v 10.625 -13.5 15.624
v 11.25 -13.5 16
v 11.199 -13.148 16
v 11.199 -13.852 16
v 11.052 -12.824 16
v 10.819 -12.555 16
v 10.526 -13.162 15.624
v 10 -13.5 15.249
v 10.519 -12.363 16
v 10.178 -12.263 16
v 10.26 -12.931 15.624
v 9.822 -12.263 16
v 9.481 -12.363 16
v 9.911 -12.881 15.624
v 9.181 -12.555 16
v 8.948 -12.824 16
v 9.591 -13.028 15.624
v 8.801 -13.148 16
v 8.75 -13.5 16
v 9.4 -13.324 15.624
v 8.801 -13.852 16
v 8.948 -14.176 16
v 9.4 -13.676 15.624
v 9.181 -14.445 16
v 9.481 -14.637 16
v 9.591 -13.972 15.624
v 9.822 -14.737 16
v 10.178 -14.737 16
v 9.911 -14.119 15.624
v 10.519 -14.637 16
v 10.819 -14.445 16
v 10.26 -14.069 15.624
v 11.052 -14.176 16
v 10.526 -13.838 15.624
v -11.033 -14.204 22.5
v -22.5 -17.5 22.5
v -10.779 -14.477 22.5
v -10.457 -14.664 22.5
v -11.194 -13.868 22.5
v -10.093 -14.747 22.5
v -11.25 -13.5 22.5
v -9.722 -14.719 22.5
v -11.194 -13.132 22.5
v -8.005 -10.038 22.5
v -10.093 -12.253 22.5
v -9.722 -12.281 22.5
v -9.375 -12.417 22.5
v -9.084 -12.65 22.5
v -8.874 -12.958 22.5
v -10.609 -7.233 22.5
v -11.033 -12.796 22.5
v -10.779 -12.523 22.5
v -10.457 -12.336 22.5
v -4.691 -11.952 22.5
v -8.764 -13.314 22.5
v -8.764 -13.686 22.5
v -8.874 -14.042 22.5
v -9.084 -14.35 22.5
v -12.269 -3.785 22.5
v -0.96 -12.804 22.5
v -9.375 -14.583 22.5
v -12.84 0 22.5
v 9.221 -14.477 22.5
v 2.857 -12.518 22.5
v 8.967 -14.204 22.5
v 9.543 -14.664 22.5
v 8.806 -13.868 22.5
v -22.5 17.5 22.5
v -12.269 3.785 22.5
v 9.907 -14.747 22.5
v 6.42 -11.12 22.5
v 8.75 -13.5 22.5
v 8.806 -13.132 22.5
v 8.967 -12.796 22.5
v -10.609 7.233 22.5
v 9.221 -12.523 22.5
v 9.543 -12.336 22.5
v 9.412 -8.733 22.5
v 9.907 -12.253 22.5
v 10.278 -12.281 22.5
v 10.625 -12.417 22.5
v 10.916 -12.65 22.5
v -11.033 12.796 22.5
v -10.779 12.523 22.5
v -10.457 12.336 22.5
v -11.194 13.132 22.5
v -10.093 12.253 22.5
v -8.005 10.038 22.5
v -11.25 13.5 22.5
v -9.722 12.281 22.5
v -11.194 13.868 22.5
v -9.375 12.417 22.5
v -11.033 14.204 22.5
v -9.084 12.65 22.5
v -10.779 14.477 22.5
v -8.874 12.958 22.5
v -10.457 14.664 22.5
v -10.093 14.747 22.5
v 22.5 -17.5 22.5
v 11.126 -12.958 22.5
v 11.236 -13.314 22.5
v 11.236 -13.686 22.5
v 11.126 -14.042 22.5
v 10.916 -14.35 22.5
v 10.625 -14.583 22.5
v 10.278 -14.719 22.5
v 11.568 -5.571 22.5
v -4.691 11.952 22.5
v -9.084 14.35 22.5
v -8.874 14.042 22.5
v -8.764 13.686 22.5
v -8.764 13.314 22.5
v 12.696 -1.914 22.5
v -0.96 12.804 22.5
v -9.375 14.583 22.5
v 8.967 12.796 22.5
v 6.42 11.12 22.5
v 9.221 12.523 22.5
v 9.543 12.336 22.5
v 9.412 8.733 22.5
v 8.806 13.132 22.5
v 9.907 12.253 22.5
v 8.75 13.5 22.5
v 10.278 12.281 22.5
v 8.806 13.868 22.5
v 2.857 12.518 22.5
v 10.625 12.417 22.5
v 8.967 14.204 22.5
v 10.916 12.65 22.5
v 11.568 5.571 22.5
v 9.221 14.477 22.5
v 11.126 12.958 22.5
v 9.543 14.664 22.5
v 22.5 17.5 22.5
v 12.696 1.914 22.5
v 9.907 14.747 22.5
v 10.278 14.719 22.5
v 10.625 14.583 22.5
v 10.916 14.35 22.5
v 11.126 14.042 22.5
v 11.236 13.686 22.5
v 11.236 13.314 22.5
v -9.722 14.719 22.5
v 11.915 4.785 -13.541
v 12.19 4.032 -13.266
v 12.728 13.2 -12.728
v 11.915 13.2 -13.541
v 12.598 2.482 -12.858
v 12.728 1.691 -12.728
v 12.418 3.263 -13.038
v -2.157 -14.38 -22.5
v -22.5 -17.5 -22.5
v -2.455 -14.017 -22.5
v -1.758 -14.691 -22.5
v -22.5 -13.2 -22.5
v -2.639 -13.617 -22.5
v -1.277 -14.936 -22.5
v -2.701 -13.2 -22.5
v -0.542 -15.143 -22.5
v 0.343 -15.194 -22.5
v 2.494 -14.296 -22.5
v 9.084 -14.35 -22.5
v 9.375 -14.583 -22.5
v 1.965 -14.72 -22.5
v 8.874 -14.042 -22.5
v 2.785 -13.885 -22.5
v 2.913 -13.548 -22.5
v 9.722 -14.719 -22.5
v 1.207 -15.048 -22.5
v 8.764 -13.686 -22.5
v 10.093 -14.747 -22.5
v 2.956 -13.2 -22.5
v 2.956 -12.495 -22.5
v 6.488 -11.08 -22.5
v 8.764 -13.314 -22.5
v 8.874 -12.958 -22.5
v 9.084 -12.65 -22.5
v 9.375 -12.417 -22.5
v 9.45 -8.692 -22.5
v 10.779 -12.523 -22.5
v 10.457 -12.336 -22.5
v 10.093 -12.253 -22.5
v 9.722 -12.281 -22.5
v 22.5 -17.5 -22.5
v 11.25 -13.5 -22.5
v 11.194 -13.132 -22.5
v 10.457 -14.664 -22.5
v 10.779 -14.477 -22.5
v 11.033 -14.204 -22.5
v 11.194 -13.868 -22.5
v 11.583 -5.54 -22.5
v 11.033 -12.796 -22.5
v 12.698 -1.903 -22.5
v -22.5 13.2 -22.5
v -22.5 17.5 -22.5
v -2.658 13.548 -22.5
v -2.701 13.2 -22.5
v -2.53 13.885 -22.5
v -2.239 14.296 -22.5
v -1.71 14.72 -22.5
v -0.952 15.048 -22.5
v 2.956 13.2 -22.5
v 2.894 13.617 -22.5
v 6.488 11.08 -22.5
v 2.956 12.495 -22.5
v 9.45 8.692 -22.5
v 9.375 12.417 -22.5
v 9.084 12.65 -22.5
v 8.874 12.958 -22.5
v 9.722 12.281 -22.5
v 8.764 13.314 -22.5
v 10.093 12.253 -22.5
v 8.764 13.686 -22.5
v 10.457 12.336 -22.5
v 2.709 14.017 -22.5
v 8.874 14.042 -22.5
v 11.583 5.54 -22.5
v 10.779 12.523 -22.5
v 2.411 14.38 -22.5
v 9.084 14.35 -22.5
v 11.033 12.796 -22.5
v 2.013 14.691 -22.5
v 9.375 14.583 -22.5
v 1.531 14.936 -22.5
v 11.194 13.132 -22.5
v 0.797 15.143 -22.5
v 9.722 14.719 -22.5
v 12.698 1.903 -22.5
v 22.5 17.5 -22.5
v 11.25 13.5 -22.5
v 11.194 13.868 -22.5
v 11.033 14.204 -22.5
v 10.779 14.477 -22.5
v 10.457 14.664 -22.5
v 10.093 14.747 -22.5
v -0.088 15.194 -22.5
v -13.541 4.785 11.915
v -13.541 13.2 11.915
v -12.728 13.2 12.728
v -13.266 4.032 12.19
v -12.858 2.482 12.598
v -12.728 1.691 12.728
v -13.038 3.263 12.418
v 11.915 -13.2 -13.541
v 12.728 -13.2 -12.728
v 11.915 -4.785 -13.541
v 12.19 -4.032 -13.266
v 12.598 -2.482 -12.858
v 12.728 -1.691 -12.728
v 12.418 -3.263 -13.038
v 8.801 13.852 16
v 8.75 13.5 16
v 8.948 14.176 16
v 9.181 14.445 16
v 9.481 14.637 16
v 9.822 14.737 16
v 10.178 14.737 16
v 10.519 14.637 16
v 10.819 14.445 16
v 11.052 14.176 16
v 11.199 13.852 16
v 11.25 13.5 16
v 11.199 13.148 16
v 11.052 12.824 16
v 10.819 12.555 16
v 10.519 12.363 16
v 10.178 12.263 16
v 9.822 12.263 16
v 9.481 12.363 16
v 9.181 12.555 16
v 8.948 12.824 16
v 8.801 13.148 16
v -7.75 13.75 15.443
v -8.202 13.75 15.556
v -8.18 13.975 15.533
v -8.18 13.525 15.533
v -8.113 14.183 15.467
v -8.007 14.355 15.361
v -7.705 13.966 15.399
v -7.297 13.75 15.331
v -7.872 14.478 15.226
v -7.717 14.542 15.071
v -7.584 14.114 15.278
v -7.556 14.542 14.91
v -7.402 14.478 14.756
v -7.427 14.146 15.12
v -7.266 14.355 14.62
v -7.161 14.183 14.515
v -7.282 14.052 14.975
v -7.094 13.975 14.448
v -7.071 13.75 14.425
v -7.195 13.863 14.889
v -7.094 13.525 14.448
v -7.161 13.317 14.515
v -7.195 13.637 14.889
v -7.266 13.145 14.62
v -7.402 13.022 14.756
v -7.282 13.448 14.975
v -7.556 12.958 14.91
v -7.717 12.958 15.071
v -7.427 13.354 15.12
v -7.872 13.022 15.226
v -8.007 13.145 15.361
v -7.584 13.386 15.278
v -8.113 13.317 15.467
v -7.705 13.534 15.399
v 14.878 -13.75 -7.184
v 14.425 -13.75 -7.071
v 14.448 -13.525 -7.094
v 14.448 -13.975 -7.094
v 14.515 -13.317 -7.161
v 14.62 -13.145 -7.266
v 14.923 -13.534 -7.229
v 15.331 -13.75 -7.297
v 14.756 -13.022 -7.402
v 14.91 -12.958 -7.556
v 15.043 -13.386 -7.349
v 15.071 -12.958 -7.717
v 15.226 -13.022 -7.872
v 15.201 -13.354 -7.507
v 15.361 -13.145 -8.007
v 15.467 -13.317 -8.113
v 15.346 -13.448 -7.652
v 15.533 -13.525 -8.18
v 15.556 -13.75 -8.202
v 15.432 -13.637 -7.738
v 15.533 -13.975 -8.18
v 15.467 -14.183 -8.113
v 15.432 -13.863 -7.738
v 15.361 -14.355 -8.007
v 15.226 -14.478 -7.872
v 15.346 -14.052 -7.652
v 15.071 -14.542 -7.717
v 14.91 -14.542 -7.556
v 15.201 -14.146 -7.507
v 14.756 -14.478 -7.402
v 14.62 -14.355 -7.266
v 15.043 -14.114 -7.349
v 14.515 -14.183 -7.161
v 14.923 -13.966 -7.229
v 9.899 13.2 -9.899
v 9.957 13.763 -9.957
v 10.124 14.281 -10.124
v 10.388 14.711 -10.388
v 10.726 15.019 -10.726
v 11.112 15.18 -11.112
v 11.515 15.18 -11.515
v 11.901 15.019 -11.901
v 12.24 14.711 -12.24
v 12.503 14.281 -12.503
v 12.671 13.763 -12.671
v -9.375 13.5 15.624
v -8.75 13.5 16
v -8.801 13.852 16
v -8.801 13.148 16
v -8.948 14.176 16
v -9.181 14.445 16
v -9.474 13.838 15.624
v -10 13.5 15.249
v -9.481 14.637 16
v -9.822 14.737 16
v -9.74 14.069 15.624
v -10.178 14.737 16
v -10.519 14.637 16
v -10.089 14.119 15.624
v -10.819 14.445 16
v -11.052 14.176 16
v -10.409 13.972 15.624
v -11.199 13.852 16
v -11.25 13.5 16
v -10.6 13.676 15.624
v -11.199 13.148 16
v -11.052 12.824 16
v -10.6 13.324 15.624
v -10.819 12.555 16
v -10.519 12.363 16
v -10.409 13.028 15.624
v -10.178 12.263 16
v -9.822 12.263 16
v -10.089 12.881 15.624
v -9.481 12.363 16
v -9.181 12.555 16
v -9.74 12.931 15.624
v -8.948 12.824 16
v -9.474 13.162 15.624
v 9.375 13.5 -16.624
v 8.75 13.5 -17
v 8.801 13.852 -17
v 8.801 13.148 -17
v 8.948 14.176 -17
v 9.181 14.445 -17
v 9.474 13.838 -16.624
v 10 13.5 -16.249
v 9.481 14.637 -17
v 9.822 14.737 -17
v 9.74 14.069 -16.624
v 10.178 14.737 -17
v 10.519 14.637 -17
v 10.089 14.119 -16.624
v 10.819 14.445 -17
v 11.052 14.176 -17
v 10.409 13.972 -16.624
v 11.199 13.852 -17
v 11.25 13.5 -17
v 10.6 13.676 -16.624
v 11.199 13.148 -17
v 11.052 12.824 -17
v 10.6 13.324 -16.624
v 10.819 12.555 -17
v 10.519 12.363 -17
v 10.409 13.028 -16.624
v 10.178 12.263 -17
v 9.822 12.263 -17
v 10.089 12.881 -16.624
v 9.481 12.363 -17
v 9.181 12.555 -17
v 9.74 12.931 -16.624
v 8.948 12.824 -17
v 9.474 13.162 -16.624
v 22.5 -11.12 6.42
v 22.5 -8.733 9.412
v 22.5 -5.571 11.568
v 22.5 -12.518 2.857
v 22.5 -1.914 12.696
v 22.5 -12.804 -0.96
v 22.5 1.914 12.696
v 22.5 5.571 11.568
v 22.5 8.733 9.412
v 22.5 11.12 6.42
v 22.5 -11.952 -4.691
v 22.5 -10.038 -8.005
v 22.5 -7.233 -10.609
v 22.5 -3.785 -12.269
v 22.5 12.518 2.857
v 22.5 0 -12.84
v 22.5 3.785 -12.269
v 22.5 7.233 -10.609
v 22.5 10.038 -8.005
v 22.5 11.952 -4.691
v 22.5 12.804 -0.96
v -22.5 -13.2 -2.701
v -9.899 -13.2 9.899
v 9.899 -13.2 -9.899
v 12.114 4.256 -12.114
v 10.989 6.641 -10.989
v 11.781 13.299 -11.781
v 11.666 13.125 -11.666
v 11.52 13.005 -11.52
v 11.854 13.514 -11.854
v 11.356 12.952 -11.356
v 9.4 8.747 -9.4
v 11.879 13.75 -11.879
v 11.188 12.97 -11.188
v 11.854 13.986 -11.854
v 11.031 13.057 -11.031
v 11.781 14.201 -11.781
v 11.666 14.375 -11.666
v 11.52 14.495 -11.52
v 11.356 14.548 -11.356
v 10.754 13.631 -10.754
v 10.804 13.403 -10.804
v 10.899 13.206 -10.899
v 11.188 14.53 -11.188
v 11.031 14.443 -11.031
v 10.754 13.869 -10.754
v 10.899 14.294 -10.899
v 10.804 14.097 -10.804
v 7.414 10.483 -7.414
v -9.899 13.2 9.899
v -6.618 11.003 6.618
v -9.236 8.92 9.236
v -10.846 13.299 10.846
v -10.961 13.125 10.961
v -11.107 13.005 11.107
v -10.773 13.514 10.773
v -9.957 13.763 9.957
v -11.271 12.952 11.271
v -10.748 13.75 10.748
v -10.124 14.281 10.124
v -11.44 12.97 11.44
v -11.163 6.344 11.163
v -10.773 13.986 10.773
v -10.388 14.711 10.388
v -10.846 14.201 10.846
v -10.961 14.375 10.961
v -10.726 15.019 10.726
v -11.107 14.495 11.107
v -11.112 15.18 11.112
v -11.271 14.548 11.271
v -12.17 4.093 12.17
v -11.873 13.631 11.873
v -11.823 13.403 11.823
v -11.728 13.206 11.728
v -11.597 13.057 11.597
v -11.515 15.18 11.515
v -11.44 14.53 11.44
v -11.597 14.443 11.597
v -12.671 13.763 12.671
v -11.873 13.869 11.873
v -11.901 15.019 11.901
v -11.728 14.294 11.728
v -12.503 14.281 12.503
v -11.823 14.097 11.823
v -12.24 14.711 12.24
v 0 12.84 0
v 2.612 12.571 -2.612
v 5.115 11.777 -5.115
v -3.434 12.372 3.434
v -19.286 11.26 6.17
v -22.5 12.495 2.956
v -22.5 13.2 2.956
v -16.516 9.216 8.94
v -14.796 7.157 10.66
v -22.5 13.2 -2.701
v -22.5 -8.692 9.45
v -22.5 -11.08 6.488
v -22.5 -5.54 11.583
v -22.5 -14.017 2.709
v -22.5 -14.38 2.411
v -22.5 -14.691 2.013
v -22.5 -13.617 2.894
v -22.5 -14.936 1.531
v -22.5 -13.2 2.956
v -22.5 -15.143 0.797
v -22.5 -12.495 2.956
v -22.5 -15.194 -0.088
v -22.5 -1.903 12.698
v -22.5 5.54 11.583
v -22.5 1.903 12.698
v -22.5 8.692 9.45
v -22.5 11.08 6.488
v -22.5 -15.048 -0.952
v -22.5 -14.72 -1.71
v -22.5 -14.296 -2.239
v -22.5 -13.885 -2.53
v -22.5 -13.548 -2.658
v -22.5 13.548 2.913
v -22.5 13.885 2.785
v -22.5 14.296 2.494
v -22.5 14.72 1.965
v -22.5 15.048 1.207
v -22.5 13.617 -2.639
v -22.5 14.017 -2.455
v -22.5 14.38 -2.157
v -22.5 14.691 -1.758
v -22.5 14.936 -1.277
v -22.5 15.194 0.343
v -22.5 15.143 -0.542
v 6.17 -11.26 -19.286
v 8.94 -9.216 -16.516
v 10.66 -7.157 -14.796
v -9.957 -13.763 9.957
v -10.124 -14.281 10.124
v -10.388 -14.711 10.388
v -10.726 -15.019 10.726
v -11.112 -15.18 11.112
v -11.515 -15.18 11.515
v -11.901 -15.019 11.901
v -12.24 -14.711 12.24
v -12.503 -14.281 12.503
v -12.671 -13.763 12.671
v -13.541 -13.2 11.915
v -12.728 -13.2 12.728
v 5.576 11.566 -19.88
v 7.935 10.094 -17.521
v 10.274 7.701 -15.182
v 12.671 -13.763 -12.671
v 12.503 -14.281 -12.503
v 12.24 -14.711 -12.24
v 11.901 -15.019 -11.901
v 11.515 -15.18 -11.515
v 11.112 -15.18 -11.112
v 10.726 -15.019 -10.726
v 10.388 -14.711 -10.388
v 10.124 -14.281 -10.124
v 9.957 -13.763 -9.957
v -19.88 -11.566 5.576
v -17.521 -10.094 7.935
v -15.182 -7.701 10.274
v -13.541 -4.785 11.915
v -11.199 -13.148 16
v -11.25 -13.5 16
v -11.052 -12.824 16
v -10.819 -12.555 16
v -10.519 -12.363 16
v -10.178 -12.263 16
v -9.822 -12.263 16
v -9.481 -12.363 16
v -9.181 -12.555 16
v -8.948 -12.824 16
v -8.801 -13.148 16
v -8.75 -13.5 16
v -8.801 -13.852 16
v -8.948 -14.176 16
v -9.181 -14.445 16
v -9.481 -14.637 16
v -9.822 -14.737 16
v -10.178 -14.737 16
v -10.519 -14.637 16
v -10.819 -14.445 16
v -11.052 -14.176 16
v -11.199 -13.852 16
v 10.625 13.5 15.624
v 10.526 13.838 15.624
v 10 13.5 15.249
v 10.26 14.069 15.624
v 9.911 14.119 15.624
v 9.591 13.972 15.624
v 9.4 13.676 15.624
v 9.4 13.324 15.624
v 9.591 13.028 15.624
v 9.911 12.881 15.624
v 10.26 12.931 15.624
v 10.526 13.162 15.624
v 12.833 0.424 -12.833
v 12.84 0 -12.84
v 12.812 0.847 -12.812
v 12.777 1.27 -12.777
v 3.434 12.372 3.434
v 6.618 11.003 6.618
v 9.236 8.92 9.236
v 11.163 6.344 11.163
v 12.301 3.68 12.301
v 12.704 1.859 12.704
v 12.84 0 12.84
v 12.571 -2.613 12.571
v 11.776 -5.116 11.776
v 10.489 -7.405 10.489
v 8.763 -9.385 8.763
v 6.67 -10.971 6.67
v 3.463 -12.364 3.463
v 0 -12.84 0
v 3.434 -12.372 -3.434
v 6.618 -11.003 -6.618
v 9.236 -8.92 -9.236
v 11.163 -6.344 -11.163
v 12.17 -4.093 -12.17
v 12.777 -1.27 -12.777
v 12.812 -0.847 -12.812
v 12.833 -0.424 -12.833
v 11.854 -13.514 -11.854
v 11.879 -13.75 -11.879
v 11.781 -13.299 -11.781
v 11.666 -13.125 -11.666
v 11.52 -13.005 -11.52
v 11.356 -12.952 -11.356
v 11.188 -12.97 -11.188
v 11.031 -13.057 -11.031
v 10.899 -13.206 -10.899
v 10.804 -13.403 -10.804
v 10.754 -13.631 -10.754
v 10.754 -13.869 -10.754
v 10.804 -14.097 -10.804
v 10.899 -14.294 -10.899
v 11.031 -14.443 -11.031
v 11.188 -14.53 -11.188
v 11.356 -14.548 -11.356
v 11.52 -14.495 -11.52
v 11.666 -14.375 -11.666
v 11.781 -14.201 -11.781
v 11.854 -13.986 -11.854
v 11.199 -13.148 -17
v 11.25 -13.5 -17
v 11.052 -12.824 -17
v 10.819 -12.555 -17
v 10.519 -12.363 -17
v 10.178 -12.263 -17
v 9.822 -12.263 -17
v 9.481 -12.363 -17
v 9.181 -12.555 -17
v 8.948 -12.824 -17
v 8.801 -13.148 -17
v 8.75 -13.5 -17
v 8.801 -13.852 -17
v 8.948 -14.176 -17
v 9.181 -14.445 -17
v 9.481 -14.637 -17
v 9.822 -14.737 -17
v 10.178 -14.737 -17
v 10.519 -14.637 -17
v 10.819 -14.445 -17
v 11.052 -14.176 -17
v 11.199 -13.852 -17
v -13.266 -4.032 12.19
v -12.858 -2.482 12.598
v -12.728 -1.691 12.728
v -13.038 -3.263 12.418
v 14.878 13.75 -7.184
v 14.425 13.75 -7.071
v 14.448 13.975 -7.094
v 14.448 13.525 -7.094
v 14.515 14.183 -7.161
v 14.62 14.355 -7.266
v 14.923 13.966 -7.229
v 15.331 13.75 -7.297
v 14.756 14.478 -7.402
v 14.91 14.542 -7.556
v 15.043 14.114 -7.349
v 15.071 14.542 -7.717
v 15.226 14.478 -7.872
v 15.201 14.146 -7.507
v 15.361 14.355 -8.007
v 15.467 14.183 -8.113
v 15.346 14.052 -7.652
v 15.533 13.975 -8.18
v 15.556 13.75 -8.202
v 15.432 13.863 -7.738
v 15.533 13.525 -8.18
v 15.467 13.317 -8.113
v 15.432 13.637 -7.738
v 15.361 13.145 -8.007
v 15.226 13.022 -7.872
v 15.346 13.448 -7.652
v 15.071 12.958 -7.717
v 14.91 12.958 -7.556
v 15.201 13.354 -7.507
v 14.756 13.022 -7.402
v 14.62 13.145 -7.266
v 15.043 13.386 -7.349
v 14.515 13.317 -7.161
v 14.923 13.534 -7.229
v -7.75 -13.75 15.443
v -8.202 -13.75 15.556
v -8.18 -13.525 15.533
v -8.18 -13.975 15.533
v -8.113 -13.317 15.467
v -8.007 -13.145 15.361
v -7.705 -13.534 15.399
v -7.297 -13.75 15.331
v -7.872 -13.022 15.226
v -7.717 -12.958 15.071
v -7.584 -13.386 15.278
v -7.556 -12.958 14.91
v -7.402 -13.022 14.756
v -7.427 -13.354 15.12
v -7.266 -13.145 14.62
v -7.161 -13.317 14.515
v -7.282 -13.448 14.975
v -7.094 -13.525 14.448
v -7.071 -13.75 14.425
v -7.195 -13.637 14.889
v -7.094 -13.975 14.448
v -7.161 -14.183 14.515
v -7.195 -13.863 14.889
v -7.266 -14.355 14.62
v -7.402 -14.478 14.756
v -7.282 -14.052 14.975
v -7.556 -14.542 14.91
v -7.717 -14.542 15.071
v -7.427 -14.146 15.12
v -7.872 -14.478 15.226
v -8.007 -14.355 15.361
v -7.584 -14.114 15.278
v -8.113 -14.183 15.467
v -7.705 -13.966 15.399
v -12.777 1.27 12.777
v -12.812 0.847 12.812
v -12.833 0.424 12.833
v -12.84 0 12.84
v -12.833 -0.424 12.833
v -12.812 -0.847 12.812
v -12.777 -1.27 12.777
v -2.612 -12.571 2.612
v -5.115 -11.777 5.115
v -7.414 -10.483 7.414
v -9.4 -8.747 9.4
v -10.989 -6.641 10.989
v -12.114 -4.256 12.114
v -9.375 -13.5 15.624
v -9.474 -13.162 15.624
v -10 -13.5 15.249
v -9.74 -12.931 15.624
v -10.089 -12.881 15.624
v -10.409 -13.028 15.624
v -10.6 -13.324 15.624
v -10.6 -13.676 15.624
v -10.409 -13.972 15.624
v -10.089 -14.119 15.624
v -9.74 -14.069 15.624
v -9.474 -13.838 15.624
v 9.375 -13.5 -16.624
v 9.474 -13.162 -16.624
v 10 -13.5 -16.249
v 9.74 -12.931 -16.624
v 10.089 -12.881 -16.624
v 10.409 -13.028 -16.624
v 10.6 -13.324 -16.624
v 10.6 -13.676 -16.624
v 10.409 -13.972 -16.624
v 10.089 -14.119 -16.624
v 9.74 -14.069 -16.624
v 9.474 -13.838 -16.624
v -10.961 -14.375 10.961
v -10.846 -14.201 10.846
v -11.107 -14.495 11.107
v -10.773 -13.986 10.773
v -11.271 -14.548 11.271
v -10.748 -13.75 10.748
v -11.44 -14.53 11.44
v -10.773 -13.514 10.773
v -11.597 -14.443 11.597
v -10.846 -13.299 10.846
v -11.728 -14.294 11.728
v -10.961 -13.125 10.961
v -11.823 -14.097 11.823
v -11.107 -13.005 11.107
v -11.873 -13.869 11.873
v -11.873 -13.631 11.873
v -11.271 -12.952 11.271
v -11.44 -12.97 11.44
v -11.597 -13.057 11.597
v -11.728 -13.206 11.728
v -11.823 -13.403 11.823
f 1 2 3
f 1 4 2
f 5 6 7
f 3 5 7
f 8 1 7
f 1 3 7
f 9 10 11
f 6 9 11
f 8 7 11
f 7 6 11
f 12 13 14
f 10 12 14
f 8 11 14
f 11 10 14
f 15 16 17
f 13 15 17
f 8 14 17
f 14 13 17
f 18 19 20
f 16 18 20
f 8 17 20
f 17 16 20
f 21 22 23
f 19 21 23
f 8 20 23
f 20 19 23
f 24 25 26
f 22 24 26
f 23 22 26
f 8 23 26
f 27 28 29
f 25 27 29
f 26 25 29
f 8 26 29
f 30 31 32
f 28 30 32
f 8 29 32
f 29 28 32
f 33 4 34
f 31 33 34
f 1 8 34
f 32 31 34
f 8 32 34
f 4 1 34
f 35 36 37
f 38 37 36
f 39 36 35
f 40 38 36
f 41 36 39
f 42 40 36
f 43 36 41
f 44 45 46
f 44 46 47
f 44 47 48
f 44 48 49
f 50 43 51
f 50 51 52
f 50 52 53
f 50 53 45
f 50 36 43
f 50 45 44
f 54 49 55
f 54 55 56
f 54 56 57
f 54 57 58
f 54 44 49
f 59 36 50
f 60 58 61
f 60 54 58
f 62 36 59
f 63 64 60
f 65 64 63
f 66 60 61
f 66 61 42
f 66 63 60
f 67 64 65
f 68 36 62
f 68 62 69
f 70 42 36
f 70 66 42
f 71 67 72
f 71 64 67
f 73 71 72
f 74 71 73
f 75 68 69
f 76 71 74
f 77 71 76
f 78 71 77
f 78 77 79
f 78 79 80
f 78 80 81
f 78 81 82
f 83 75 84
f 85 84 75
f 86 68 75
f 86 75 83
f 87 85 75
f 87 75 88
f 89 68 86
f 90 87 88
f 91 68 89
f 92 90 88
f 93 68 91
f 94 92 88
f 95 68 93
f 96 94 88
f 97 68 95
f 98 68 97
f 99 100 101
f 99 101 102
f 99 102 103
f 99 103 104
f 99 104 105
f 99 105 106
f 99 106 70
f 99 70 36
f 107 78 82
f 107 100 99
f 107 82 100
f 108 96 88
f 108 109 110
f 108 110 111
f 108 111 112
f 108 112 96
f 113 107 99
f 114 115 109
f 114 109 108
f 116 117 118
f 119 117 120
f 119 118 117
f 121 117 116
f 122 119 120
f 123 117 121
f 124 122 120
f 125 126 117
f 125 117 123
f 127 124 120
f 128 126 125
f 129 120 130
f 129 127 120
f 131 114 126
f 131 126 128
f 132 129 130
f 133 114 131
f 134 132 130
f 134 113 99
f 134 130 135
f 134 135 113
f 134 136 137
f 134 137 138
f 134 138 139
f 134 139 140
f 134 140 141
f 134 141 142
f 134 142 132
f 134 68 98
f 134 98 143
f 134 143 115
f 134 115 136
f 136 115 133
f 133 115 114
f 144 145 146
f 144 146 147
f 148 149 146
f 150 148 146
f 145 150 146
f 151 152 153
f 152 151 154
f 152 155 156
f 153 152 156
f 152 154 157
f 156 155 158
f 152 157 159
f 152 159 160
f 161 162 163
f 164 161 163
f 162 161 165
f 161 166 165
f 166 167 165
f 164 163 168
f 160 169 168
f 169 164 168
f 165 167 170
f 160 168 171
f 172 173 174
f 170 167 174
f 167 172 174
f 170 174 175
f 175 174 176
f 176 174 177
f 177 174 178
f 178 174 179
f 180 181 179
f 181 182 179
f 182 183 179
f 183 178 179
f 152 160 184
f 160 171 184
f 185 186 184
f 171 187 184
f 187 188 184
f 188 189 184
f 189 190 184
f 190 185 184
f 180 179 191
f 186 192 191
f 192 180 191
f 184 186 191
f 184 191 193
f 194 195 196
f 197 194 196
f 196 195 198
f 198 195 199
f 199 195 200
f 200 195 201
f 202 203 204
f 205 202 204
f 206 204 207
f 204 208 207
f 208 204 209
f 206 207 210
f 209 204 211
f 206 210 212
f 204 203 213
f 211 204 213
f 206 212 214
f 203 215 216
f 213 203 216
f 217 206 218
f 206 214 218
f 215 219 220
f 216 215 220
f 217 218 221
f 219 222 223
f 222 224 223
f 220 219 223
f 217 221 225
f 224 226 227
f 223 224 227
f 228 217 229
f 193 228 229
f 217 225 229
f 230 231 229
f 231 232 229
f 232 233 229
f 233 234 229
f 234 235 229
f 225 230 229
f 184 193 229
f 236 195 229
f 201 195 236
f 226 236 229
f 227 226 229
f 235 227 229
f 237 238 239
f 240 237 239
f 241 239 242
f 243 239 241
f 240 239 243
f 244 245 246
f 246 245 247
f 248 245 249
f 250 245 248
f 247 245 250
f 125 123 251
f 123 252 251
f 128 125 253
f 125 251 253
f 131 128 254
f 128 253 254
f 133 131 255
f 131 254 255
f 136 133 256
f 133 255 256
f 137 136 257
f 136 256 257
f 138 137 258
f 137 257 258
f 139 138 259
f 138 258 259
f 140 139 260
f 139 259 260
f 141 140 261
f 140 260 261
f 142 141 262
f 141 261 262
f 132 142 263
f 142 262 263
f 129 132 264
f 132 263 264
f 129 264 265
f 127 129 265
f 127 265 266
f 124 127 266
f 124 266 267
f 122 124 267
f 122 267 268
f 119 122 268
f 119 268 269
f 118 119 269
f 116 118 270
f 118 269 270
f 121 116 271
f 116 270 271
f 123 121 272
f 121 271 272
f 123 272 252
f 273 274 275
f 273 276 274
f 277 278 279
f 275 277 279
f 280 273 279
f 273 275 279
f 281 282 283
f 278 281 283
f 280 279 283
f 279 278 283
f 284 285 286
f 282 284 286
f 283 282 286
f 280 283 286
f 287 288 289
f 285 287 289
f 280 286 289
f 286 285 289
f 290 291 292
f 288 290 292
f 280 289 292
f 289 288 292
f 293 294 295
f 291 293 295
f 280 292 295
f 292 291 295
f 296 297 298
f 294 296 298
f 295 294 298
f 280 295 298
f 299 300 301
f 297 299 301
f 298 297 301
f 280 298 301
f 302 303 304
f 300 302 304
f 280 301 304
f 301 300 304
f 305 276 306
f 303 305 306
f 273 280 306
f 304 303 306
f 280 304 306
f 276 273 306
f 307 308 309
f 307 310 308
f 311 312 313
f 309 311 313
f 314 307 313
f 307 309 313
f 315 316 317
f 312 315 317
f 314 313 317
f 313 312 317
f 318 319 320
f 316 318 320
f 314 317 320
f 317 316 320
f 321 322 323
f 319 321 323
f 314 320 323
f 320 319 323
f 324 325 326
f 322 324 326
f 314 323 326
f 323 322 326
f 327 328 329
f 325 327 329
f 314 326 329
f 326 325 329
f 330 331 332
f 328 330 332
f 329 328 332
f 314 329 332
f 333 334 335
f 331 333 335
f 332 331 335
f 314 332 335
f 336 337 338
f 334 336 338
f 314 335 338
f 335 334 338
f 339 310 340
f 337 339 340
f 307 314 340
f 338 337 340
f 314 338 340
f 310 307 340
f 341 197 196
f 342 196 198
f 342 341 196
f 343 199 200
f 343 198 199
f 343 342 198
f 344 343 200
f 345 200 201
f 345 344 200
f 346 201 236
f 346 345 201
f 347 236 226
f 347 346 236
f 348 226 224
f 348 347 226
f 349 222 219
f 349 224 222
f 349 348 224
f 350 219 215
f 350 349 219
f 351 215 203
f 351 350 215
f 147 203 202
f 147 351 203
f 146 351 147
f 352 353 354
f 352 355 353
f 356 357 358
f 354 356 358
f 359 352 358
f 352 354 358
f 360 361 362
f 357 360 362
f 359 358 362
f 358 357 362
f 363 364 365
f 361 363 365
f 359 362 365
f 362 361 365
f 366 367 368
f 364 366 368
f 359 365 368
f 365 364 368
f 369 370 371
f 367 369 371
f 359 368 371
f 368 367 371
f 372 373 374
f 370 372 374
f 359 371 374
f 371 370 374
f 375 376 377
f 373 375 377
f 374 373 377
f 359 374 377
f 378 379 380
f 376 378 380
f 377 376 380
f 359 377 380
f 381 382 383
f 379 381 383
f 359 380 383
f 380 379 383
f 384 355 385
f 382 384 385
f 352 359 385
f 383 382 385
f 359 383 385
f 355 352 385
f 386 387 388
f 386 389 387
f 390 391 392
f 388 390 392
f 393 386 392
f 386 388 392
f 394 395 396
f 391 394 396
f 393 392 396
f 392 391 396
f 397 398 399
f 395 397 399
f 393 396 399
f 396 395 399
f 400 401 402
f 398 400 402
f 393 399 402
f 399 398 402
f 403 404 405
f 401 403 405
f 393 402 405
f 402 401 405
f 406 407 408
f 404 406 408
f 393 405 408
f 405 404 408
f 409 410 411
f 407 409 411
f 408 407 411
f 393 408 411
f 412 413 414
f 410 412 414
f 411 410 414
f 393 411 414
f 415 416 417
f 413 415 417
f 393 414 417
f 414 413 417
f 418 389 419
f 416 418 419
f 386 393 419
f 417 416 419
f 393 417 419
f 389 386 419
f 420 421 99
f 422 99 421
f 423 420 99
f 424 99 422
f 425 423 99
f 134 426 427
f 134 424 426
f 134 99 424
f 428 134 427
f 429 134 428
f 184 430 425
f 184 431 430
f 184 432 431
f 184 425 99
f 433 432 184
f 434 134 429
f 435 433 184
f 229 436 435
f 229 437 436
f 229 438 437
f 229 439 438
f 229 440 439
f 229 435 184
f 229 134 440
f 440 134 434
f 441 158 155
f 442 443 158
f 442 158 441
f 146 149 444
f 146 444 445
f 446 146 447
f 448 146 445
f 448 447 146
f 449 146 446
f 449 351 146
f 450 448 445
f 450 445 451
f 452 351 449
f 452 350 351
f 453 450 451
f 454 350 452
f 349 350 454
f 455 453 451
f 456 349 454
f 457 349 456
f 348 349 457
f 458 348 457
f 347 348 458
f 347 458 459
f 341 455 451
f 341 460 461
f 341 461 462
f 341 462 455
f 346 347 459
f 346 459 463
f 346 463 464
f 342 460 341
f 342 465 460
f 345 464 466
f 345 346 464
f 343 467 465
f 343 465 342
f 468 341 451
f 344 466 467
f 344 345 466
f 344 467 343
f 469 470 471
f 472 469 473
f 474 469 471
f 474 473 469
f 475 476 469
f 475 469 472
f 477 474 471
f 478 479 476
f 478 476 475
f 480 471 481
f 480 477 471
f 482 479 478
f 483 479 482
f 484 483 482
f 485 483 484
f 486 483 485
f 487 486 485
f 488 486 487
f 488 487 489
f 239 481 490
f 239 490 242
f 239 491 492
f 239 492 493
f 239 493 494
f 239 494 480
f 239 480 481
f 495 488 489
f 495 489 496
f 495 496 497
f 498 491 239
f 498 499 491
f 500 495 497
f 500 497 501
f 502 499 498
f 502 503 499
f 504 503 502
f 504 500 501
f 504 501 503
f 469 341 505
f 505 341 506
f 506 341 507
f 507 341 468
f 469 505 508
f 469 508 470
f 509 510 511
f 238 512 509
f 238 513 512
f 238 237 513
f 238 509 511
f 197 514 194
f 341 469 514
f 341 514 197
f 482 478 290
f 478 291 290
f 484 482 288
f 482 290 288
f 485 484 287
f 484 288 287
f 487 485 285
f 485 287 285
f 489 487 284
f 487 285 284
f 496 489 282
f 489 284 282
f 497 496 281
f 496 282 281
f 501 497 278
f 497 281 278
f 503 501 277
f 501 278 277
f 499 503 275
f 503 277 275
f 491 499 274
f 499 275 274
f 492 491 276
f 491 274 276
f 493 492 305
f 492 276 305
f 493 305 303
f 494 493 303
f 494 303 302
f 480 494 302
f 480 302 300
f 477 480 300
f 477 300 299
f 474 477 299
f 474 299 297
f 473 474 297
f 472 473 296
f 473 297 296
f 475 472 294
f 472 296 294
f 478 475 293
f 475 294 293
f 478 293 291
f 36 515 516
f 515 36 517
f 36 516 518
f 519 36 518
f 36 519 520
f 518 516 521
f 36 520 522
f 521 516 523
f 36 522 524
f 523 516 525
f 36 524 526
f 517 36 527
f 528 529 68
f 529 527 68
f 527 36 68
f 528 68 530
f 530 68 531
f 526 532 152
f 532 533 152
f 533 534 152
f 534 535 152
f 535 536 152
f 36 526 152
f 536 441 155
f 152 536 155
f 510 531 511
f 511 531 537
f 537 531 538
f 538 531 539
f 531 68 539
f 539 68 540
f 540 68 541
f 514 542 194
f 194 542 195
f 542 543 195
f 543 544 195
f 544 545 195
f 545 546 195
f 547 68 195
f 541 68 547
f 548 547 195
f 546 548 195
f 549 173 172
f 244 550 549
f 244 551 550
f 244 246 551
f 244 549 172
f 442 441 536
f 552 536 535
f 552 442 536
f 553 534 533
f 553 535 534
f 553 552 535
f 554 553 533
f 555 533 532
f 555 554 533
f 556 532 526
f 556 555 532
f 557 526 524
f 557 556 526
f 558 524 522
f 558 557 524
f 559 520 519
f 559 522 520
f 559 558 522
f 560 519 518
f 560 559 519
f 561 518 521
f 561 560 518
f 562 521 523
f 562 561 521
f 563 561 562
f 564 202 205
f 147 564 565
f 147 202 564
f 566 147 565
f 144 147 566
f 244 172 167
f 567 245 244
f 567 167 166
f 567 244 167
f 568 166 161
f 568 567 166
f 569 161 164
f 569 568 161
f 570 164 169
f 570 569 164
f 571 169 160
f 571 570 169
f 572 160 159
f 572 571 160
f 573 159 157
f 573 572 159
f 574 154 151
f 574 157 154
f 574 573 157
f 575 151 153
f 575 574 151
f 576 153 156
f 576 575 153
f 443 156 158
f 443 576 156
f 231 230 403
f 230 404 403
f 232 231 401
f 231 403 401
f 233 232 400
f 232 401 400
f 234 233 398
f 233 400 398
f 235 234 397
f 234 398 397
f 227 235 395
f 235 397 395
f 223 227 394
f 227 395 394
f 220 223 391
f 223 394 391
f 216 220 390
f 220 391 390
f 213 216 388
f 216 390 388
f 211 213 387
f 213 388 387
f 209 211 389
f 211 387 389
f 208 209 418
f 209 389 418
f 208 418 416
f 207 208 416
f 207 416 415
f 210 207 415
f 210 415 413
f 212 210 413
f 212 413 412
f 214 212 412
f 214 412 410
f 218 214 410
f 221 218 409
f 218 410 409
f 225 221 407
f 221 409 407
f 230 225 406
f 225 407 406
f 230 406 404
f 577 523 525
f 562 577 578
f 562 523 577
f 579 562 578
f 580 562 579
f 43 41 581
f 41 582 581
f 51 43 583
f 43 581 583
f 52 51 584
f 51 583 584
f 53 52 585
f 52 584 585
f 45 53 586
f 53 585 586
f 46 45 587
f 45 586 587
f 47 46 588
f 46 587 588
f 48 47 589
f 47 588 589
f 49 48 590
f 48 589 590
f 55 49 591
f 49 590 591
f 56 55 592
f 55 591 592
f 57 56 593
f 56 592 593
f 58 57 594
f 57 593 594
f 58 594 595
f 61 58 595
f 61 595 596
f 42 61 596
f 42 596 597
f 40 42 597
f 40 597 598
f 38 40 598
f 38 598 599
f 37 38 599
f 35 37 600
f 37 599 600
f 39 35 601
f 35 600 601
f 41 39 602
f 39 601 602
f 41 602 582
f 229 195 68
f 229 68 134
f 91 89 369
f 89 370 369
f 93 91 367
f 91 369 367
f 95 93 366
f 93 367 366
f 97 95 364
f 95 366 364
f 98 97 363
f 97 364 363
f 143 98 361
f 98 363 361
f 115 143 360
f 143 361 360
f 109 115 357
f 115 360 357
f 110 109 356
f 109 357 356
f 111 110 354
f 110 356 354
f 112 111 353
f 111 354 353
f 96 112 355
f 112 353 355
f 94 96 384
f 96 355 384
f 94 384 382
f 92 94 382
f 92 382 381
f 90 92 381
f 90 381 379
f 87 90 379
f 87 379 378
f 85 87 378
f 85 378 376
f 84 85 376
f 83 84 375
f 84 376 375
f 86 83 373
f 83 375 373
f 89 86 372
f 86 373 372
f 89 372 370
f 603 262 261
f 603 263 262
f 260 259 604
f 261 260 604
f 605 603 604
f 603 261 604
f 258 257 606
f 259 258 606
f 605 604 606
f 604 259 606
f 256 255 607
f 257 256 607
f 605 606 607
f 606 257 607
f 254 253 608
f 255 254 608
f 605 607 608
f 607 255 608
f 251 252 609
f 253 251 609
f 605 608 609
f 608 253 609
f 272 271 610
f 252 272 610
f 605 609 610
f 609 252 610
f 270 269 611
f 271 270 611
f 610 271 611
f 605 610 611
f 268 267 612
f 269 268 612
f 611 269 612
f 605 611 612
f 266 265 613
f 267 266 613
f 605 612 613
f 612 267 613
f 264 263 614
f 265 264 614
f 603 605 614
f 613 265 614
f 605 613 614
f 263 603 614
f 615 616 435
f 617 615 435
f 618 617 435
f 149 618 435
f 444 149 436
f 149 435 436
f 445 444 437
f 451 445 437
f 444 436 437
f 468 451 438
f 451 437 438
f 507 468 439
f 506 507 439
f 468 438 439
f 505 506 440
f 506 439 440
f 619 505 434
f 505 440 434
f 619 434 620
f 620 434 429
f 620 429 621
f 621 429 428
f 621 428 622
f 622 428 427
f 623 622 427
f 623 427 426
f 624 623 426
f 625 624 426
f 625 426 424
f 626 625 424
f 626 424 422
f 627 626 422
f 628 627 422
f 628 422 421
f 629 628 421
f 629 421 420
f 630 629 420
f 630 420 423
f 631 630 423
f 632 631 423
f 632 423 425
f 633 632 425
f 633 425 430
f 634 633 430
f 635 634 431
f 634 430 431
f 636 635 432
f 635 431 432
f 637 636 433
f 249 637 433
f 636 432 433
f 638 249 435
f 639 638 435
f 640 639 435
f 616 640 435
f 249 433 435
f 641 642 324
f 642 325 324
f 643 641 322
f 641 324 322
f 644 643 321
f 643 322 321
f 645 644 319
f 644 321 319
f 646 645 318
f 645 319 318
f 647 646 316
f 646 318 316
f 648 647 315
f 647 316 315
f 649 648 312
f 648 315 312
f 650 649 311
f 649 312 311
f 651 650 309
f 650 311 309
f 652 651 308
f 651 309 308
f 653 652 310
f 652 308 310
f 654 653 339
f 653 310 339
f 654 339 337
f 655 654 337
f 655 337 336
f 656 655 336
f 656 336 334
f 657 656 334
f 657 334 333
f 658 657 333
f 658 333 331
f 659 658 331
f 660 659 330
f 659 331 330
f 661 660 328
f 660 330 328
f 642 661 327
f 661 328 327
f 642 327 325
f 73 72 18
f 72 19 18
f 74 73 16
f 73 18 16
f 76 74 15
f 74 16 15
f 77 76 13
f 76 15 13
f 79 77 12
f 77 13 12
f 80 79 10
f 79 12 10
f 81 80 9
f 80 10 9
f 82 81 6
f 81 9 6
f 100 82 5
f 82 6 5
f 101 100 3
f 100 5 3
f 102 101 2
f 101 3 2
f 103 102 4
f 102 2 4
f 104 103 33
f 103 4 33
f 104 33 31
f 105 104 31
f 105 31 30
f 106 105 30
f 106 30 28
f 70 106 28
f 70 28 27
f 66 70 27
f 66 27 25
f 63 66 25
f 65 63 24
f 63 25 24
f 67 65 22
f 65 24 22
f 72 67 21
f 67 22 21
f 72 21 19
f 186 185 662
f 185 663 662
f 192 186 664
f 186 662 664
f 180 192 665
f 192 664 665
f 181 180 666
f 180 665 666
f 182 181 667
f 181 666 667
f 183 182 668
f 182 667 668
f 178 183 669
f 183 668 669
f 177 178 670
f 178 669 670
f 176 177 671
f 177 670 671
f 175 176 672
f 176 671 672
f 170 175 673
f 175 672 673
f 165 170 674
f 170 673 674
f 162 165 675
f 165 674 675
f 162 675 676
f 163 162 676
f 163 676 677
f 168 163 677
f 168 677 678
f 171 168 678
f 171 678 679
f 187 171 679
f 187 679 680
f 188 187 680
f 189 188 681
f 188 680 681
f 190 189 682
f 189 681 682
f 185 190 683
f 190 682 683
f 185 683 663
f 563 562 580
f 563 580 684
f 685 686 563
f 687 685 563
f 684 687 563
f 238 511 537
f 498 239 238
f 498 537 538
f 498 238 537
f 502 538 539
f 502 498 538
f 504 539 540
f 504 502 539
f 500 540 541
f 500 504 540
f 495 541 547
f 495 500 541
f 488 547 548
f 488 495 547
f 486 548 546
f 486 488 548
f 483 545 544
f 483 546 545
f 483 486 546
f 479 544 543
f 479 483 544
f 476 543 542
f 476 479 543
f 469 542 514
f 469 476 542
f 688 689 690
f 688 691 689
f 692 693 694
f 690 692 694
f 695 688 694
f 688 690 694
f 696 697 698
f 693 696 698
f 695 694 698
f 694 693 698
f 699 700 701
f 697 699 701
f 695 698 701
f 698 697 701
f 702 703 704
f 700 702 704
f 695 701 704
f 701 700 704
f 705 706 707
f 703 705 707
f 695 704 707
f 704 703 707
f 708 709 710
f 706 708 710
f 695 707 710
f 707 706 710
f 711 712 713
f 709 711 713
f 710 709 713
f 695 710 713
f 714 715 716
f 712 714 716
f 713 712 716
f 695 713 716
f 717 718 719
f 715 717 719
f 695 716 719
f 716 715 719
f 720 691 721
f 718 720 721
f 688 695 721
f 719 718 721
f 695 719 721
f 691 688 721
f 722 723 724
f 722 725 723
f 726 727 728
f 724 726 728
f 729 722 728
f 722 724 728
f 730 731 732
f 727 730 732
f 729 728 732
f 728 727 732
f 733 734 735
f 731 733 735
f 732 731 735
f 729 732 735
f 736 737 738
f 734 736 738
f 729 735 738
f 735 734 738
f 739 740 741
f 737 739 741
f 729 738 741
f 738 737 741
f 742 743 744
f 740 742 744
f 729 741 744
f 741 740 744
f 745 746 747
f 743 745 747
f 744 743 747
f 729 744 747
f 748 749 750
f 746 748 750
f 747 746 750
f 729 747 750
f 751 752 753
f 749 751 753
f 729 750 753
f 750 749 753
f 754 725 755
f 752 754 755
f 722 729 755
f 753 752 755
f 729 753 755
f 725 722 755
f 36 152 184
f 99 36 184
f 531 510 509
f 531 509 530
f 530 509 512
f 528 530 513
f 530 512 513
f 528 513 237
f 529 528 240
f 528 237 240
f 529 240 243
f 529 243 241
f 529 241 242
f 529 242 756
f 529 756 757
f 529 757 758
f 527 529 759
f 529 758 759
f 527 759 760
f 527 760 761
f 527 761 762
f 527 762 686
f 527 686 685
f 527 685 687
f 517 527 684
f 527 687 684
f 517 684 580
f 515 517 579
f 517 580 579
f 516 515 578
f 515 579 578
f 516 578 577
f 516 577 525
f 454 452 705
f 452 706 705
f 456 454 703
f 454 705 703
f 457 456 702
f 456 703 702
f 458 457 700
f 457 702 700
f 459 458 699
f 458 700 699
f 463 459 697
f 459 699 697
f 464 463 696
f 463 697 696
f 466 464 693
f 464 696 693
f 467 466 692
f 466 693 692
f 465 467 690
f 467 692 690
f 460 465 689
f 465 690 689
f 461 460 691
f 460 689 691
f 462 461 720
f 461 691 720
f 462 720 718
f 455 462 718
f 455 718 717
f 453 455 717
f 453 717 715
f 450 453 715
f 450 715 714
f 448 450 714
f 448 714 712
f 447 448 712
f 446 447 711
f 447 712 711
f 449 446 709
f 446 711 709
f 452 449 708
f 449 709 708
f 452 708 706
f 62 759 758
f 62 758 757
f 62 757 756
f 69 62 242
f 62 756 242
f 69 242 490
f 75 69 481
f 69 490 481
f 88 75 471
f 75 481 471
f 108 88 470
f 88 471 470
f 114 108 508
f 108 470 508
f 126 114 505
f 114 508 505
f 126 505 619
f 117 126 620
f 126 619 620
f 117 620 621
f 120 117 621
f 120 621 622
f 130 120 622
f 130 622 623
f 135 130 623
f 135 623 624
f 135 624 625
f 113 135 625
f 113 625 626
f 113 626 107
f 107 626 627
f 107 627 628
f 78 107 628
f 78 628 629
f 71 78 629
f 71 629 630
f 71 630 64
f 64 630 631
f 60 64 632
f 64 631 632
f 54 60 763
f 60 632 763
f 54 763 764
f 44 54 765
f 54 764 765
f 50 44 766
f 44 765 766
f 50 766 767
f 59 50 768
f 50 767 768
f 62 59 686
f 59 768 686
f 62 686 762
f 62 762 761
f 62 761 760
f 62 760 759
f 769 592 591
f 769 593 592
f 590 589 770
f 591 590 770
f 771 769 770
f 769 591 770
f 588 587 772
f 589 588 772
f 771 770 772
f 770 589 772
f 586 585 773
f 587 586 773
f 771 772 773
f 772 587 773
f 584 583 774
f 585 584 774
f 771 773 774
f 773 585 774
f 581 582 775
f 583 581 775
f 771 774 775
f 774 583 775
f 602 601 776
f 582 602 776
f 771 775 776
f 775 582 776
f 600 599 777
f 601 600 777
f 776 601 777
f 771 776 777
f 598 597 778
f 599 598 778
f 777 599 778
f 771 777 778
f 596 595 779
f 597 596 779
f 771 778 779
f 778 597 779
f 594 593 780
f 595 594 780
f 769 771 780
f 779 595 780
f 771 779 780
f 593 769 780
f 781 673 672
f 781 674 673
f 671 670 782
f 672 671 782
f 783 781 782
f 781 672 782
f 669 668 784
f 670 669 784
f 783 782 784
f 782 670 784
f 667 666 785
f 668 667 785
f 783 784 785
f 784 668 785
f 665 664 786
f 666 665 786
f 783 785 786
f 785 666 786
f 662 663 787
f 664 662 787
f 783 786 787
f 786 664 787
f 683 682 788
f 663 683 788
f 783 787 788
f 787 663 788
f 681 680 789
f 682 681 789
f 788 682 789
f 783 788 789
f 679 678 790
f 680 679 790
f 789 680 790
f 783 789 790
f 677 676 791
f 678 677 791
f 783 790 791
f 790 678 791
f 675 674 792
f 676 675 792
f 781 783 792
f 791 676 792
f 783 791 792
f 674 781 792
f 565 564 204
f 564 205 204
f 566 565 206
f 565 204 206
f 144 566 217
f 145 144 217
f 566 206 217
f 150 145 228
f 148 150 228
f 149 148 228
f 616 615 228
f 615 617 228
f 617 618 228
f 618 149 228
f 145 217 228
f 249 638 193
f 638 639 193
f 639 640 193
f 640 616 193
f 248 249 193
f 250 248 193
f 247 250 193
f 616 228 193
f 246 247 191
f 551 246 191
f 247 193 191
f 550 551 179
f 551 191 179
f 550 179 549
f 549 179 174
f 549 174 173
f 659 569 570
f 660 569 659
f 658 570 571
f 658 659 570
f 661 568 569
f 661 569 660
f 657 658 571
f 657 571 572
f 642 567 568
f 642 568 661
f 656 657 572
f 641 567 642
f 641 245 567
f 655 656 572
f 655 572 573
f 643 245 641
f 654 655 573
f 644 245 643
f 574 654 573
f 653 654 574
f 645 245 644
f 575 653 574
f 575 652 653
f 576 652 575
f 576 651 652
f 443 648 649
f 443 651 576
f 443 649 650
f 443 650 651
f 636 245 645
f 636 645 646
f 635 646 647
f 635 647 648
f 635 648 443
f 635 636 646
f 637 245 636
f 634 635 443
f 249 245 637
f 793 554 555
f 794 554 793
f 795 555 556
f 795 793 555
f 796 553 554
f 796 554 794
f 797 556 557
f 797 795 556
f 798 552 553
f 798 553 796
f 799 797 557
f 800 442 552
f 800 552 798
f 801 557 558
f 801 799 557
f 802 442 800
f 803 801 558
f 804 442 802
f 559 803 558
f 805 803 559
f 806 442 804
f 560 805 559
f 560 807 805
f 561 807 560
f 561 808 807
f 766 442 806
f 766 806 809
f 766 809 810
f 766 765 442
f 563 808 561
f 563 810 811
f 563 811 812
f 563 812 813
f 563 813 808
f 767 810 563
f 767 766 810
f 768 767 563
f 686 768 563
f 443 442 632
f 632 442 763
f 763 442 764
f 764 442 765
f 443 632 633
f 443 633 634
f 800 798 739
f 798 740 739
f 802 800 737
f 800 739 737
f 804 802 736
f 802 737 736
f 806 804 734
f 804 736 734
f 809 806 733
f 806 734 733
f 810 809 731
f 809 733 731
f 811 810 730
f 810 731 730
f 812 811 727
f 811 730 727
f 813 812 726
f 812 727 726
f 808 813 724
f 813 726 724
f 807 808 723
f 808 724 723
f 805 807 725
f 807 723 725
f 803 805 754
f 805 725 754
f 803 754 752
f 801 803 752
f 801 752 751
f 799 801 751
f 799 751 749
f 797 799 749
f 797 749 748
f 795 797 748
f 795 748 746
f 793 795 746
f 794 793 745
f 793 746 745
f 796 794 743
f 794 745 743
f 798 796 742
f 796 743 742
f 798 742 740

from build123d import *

# Parameters (mm, degrees)
SKETCH1_W             = 45
SKETCH1_H             = 45
BOSS_EXTRUDE1_DEPTH   = 17.5
CUT_EXTRUDE1_REACH    = 55.268
SKETCH2_R             = 12.8397
SKETCH3_R             = 12.8397
CUT_EXTRUDE2_DEPTH    = 54.268189382
CUT_EXTRUDE3_DEPTH    = 13.2
CUT_EXTRUDE4_DEPTH    = 31.819805153
M3_TAPPED_HOLE1_D     = 2.5
M3_TAPPED_HOLE1_DEPTH = 6.5
M3_TAPPED_HOLE1_TIP   = 0.751075774
M3_TAPPED_HOLE2_D     = 2.5
M3_TAPPED_HOLE2_DEPTH = 5.5
M3_TAPPED_HOLE2_TIP   = 0.751075774
M2_TAPPED_HOLE1_D     = 1.6
M2_TAPPED_HOLE1_DEPTH = 5.2
M2_TAPPED_HOLE1_TIP   = 0.480688495


# Read off the part's stored shape, not the designer's step: Cut-Extrude4
with BuildPart() as part:
    # Sketch1 → Boss-Extrude1 (new, symmetric)
    with BuildSketch(Plane(origin=(0, 0, 0), x_dir=(1, 0, 0), z_dir=(0, 1, 0))):
        Rectangle(SKETCH1_W, SKETCH1_H)
    extrude(amount=BOSS_EXTRUDE1_DEPTH, both=True)

    # Sketch2 → Cut-Extrude1 (cut, up to next)
    with BuildSketch(Plane(origin=(22.5, 0, 0), x_dir=(0, 0, -1), z_dir=(1, 0, 0)), mode=Mode.PRIVATE) as cut_extrude1_sk1:
        Circle(SKETCH2_R)
    cut_extrude1_tool1 = extrude(cut_extrude1_sk1.sketch, amount=-CUT_EXTRUDE1_REACH, mode=Mode.PRIVATE) & part.part
    add(cut_extrude1_tool1.solids().sort_by_distance((22.5, 0, 0))[0], mode=Mode.SUBTRACT)

    # Sketch3 → Cut-Extrude2 (cut, through all)
    with BuildSketch(Plane(origin=(0, 0, -22.5), x_dir=(-1, 0, 0), z_dir=(0, 0, -1))):
        Circle(SKETCH3_R)
    extrude(amount=-CUT_EXTRUDE2_DEPTH, mode=Mode.SUBTRACT)

    # Sketch5 → Cut-Extrude3 (cut, symmetric)
    with BuildSketch(Plane(origin=(0, 0, 0), x_dir=(1, 0, 0), z_dir=(0, 1, 0))):
        Polygon((-12.727922061, -12.727922061), (12.727922061, 12.727922061), (11.914749263, 13.54109486), (-13.54109486, -11.914749263), align=None)
    extrude(amount=CUT_EXTRUDE3_DEPTH, both=True, mode=Mode.SUBTRACT)

    # Cut-Extrude4 outline → Cut-Extrude4 (cut)
    with BuildSketch(Plane(origin=(0, 0, 0), x_dir=(-0.7071067811865486, 0, 0.7071067811865465), z_dir=(-0.7071067811865465, 0, -0.7071067811865486))):
        with BuildLine():
            ThreePointArc((-14, 13.2), (-16, 15.2), (-18, 13.2))
            Line((-18, 13.2), (-18, -13.2))
            ThreePointArc((-18, -13.2), (-16, -15.2), (-14, -13.2))
            Line((-14, -13.2), (14, -13.2))
            ThreePointArc((14, -13.2), (16, -15.2), (18, -13.2))
            Line((18, -13.2), (18, 13.2))
            ThreePointArc((18, 13.2), (16, 15.2), (14, 13.2))
            Line((14, 13.2), (-14, 13.2))
        make_face()
    extrude(amount=CUT_EXTRUDE4_DEPTH, mode=Mode.SUBTRACT)

    # M3 Tapped Hole1
    with Locations(Plane.XY.offset(22.5)):
        with Locations((-10, -13.5), (10, -13.5), (10, 13.5), (-10, 13.5)):
            Hole(M3_TAPPED_HOLE1_D / 2, depth=M3_TAPPED_HOLE1_DEPTH)
            with Locations((0, 0, -(M3_TAPPED_HOLE1_DEPTH + M3_TAPPED_HOLE1_TIP / 2))):  # 118° drill point
                Cone(0, M3_TAPPED_HOLE1_D / 2, M3_TAPPED_HOLE1_TIP, mode=Mode.SUBTRACT)

    # M3 Tapped Hole2
    with Locations(Plane(origin=(0, 0, -22.5), x_dir=(-1, 0, 0), z_dir=(0, 0, -1))):
        with Locations((-10, 13.5), (-10, -13.5)):
            Hole(M3_TAPPED_HOLE2_D / 2, depth=M3_TAPPED_HOLE2_DEPTH)
            with Locations((0, 0, -(M3_TAPPED_HOLE2_DEPTH + M3_TAPPED_HOLE2_TIP / 2))):  # 118° drill point
                Cone(0, M3_TAPPED_HOLE2_D / 2, M3_TAPPED_HOLE2_TIP, mode=Mode.SUBTRACT)

    # M2 Tapped Hole1
    with Locations(Plane(origin=(0, 0, 0), x_dir=(-0.7071067811865486, 0, 0.7071067811865465), z_dir=(-0.7071067811865465, 0, -0.7071067811865486))):
        with Locations((-16, -13.75), (-16, 13.75), (16, 13.75), (16, -13.75)):
            Hole(M2_TAPPED_HOLE1_D / 2, depth=M2_TAPPED_HOLE1_DEPTH)
            with Locations((0, 0, -(M2_TAPPED_HOLE1_DEPTH + M2_TAPPED_HOLE1_TIP / 2))):  # 118° drill point
                Cone(0, M2_TAPPED_HOLE1_D / 2, M2_TAPPED_HOLE1_TIP, mode=Mode.SUBTRACT)


solid = part.part
